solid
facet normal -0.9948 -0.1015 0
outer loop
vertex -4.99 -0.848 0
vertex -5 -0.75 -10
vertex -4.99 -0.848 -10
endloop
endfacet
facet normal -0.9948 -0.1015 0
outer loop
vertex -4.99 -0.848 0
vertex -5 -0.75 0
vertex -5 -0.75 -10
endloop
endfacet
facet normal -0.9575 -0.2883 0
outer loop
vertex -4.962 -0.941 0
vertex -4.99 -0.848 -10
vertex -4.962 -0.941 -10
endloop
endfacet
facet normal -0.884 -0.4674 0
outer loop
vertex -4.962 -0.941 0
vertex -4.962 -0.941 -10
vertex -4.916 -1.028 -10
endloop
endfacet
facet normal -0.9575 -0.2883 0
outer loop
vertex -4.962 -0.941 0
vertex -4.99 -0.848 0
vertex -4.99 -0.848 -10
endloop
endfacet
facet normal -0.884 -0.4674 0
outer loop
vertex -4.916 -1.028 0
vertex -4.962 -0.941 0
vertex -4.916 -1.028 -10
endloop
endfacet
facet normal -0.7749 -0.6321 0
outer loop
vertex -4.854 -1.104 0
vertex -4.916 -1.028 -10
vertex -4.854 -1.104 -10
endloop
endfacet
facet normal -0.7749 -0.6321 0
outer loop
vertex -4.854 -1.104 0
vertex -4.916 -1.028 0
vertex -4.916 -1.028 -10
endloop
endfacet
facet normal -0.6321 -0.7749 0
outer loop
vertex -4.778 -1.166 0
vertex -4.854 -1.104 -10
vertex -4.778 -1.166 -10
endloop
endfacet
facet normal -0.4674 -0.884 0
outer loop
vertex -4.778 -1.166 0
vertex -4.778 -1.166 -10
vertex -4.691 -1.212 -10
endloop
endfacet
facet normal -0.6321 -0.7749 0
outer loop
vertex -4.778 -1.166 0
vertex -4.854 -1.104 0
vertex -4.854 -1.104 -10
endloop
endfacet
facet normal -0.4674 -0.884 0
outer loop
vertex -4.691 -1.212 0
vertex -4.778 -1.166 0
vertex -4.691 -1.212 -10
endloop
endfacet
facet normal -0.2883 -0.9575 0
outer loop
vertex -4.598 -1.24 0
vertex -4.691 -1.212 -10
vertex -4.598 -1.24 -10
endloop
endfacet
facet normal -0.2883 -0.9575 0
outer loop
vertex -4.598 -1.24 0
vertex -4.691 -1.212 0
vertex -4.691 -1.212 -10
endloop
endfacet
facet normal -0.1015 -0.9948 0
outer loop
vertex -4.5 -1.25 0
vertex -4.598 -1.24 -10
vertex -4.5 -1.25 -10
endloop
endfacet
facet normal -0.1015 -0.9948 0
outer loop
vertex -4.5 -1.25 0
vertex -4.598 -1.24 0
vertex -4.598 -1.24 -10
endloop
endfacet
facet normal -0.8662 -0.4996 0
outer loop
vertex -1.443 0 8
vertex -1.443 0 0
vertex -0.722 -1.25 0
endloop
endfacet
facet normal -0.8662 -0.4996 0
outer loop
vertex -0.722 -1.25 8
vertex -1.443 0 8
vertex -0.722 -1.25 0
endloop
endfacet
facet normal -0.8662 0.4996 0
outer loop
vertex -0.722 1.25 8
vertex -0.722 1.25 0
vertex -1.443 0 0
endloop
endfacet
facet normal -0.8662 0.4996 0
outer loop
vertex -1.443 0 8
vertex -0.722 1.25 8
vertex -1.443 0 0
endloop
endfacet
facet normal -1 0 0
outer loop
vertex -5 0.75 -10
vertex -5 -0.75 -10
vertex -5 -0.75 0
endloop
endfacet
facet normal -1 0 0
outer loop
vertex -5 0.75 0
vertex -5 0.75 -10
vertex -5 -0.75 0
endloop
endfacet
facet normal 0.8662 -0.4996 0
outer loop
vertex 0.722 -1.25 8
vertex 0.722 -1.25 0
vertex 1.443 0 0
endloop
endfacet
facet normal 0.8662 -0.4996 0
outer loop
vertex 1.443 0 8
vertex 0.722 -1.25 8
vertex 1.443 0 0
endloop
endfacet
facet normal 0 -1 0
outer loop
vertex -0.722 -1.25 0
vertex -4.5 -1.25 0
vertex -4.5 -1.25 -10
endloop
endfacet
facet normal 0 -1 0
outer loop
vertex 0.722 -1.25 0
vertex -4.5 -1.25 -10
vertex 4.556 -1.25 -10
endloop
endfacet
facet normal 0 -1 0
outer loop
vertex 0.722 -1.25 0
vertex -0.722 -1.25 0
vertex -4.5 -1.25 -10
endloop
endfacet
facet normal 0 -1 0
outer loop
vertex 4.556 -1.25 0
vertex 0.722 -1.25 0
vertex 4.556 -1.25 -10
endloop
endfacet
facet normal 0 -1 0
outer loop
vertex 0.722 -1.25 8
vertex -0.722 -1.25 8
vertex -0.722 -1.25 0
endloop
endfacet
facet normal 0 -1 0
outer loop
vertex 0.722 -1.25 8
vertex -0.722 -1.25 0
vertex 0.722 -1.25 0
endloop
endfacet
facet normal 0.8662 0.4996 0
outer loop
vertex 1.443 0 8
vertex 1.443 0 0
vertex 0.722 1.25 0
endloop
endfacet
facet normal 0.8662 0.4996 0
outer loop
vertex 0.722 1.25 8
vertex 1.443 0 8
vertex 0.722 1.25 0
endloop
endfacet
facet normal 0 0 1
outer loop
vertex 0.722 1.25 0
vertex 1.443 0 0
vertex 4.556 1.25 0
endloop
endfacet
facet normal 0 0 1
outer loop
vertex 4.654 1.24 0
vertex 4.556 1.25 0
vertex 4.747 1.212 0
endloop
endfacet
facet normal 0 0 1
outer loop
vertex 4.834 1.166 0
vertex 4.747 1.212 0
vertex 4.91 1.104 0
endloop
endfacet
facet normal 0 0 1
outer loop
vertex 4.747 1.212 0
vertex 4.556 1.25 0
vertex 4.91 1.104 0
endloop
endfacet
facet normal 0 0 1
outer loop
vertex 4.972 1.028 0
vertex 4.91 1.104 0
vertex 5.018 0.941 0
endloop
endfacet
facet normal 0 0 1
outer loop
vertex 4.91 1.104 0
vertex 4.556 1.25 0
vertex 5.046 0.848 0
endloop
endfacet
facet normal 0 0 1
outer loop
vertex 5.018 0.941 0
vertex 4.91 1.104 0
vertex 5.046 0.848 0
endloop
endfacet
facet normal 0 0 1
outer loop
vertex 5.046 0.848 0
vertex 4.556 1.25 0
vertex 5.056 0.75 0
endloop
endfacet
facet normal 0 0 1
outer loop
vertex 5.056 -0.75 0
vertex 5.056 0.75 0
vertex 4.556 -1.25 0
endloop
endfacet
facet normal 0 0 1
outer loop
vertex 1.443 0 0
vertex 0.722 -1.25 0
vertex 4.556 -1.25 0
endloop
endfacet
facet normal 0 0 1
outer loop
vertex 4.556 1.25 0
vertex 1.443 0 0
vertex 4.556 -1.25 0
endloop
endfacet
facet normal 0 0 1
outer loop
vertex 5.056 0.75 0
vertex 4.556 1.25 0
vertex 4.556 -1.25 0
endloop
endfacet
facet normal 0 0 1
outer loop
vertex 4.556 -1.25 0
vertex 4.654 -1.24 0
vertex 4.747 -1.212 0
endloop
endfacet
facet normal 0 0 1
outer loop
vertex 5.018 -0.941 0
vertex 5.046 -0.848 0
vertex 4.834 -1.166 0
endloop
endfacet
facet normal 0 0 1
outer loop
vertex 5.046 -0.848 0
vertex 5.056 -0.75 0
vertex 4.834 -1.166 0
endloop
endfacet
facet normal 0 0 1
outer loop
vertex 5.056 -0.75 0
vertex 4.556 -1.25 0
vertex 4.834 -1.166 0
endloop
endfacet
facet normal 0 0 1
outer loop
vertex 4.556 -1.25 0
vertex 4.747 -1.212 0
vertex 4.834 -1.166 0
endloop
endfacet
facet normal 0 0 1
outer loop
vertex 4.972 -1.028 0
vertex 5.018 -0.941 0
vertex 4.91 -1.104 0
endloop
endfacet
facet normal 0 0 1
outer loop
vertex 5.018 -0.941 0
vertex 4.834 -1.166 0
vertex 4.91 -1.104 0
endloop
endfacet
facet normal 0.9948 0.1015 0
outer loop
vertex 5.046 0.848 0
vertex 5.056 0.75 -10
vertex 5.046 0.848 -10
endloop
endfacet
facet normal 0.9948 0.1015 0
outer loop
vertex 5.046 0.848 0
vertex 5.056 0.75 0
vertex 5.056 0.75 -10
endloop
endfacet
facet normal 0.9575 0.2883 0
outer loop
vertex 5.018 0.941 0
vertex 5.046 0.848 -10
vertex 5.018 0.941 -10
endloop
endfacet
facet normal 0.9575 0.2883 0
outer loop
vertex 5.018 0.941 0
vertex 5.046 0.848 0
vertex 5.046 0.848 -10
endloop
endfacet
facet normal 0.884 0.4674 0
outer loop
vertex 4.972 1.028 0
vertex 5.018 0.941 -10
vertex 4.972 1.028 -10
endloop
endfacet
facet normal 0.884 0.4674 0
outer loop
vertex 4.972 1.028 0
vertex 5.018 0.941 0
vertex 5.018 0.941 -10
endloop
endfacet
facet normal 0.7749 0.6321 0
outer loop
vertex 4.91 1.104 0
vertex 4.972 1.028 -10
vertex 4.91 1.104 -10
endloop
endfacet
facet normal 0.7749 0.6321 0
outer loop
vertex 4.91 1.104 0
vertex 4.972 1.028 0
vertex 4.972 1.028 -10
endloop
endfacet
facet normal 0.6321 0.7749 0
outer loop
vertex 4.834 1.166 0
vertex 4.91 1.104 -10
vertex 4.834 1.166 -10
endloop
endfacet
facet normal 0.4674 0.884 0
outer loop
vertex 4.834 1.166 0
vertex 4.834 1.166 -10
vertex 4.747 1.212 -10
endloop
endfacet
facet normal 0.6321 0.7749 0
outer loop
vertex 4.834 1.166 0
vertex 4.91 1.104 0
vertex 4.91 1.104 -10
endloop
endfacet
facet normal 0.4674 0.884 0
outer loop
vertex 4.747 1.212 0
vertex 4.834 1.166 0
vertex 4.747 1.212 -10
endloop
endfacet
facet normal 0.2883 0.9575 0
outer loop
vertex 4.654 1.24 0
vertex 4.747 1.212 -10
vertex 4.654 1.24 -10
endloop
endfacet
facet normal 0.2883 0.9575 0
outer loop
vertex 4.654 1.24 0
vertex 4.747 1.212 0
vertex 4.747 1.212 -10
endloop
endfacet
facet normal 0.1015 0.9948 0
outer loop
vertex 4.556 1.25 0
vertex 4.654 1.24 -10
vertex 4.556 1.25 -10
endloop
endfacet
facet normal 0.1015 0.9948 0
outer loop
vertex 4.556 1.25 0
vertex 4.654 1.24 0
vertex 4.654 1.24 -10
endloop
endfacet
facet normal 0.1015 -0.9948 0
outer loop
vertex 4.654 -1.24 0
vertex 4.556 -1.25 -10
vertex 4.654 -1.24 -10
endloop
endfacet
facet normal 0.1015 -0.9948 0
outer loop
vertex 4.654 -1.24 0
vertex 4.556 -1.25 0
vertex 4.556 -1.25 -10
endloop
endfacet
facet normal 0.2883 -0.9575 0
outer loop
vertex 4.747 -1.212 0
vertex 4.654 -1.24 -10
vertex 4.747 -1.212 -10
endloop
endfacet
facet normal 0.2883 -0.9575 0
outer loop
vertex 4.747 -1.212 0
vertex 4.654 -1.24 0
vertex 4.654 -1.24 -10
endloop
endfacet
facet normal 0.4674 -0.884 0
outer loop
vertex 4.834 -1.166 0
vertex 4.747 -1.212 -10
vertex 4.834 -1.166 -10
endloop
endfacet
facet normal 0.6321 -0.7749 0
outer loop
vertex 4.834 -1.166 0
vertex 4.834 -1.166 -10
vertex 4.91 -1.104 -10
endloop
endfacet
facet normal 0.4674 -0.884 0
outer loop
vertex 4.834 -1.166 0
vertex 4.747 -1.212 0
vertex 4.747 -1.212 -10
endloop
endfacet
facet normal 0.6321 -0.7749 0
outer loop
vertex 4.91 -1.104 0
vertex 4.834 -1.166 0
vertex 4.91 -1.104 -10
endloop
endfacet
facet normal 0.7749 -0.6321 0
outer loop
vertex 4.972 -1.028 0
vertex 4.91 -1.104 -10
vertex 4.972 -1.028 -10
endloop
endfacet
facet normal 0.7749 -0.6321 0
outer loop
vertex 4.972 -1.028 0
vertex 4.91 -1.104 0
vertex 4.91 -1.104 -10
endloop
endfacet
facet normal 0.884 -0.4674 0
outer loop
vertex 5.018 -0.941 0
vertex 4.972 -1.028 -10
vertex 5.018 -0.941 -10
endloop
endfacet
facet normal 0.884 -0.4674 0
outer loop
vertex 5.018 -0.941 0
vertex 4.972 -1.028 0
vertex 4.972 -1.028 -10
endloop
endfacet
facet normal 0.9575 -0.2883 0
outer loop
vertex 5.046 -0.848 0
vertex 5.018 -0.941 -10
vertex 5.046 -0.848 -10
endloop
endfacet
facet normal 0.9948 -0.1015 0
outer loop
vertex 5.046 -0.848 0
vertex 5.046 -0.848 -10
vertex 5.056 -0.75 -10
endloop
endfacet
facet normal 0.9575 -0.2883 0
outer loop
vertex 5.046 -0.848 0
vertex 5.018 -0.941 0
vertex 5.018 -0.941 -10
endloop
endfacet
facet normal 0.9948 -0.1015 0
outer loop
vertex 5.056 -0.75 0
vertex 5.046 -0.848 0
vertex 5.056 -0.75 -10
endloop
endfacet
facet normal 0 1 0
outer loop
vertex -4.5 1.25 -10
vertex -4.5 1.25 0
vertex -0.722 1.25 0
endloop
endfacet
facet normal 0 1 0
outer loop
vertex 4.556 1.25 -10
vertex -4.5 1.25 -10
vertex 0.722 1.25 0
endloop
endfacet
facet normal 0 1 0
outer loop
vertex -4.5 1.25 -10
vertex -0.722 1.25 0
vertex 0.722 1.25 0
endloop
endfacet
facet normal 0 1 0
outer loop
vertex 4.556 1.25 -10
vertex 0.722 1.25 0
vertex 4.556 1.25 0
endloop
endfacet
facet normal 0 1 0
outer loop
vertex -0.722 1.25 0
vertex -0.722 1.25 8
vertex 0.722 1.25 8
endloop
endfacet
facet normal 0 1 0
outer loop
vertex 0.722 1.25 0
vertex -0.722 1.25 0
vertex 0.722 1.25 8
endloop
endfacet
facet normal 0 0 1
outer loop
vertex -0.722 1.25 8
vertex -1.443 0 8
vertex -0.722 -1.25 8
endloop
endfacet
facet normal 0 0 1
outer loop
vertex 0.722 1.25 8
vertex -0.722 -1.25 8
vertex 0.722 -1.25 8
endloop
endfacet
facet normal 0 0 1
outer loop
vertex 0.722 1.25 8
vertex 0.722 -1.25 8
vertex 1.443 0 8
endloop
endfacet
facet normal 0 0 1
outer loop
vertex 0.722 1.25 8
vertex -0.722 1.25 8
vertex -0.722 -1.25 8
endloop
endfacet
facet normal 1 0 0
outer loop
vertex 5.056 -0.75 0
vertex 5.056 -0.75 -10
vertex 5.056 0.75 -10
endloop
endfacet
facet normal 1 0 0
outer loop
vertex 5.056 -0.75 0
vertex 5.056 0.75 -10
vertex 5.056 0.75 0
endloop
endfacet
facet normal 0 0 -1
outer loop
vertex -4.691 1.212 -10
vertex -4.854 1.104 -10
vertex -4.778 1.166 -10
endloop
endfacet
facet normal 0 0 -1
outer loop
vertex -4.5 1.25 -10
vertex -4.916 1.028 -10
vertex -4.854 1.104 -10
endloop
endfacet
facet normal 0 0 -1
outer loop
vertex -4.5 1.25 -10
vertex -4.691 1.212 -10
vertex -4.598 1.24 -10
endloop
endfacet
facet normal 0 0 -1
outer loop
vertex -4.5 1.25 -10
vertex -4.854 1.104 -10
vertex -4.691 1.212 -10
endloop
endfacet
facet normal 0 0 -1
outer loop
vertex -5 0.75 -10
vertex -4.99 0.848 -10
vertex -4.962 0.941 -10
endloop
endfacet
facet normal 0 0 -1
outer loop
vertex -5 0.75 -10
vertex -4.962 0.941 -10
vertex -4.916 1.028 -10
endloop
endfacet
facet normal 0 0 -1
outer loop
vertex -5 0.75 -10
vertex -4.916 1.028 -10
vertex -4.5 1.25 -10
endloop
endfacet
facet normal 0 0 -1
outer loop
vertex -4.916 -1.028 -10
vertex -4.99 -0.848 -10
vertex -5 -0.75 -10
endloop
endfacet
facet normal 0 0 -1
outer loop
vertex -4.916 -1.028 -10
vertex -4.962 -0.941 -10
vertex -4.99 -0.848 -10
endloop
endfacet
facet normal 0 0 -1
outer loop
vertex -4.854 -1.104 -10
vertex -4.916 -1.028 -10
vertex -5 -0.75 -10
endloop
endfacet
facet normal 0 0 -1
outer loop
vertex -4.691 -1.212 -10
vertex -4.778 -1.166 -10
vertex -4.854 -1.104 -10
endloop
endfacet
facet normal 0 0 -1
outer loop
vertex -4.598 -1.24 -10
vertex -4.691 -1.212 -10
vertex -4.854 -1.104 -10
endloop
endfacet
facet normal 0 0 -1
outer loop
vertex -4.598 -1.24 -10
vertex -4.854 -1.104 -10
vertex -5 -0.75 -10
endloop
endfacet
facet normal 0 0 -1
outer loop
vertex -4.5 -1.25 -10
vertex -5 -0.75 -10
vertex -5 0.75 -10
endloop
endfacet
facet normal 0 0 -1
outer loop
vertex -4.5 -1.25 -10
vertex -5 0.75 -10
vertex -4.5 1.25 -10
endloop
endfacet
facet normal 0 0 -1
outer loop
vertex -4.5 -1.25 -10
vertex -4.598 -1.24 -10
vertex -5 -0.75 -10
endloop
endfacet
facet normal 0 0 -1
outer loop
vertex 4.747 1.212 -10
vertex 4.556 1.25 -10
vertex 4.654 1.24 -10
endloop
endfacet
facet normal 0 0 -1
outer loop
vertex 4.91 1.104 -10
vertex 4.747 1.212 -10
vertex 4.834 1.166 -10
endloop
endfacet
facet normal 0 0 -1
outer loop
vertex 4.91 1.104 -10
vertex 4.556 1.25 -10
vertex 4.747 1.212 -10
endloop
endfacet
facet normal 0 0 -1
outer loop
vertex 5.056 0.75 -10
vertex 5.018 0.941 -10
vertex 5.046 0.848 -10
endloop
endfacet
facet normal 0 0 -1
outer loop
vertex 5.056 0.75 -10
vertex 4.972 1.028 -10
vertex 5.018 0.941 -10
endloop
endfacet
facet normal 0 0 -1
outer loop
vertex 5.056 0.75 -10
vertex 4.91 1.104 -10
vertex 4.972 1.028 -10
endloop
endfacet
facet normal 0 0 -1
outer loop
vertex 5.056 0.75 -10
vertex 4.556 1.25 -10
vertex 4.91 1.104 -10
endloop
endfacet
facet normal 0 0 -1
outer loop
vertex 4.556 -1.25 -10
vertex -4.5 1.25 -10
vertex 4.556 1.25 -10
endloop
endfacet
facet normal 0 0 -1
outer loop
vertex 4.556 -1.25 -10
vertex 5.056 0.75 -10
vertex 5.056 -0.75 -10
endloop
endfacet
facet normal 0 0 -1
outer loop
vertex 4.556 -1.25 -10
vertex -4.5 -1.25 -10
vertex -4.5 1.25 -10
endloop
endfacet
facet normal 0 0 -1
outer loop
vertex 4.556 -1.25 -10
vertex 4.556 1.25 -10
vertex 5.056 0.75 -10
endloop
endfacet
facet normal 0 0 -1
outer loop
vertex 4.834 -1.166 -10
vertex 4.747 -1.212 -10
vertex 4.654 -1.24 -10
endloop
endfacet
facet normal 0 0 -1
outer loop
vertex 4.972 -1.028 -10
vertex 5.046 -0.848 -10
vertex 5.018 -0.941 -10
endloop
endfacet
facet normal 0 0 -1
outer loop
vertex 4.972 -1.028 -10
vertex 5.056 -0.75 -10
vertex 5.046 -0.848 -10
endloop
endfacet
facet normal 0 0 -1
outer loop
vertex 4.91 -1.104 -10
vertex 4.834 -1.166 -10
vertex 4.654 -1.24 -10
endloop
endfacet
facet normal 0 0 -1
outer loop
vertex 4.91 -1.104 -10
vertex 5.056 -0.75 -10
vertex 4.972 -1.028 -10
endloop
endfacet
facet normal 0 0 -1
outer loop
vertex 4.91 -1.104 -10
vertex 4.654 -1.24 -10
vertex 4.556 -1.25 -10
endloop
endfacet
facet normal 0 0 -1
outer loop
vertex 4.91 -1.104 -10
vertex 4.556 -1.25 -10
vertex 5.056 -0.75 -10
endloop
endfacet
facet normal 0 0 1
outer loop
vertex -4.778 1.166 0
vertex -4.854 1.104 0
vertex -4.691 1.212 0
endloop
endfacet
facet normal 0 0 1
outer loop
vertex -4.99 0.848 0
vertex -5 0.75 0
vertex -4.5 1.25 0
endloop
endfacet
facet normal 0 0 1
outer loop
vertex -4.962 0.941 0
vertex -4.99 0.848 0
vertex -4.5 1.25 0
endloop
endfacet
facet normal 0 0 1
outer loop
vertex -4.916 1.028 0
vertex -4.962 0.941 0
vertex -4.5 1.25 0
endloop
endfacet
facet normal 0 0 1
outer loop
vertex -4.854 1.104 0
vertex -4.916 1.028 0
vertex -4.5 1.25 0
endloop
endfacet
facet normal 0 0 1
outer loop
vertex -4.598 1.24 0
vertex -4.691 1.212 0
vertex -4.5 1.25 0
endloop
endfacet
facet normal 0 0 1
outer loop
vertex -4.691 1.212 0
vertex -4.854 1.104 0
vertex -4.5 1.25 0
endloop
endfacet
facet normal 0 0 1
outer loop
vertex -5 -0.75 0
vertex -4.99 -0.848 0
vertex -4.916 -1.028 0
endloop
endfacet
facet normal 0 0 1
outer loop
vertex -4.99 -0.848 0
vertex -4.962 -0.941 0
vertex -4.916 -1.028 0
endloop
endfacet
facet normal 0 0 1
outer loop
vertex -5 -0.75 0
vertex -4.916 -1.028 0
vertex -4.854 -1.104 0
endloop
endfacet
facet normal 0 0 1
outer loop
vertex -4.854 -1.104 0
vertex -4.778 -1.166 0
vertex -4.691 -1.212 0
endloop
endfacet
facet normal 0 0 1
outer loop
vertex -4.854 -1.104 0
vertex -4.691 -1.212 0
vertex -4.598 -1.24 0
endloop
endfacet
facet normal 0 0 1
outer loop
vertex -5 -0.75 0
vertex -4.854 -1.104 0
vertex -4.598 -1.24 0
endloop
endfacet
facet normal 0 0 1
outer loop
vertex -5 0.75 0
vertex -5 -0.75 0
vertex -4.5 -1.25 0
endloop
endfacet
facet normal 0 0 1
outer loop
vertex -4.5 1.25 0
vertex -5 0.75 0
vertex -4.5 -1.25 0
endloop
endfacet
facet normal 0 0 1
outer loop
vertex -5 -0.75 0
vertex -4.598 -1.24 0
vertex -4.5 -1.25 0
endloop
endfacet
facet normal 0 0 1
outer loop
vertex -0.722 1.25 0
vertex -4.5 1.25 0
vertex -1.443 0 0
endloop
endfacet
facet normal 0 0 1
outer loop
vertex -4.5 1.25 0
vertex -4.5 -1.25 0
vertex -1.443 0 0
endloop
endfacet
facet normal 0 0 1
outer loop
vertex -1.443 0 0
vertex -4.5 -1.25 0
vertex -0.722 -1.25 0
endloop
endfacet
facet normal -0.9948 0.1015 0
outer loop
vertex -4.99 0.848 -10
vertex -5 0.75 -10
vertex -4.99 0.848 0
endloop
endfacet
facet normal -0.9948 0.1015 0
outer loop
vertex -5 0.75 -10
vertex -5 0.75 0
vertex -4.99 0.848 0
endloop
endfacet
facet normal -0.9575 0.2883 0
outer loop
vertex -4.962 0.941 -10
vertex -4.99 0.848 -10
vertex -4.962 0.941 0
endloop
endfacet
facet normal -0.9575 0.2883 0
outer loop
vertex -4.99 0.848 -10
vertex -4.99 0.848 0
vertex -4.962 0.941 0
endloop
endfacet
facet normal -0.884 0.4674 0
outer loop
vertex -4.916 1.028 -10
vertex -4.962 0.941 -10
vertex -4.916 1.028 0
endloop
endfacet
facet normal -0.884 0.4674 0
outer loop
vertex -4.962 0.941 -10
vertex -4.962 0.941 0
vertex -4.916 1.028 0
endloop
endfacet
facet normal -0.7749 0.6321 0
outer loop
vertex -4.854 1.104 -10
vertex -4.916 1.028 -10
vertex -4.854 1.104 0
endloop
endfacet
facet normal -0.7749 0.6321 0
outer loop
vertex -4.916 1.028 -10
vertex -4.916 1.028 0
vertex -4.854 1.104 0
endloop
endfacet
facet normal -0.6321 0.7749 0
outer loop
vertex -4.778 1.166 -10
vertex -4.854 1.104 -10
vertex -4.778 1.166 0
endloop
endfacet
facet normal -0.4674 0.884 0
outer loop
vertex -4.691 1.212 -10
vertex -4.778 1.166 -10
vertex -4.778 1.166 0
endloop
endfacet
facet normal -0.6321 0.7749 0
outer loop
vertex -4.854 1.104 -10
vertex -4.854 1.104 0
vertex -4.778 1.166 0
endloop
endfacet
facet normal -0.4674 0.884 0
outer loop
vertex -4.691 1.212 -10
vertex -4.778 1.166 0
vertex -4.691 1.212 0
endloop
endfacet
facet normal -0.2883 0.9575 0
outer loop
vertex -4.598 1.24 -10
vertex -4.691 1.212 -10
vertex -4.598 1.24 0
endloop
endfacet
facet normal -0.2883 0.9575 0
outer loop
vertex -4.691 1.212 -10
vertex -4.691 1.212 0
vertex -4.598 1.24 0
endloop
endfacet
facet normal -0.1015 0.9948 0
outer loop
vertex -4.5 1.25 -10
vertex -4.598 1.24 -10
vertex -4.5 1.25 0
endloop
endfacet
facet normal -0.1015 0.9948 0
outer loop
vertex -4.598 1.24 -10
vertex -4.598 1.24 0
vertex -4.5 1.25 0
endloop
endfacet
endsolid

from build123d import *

# Parameters (mm, degrees)
F1_DEPTH      = 8
F2_W          = 10.055962
F2_H          = 10
F3_DEPTH      = 1.25
F3_DEPTH_BACK = 1.25
F4_R          = 0.5


with BuildPart() as f1:
    # F0 (on Top) → F1 (new body)
    with BuildSketch(Plane.XY):
        Polygon((0.721688, 1.25), (-0.721688, 1.25), (-1.443376, 0), (-0.721688, -1.25), (0.721688, -1.25), (1.443376, 0), align=None)
    extrude(amount=F1_DEPTH)

    # F2 (on Front) → F3 (join, two sides)
    with BuildSketch(Plane.XZ) as f3_sk:
        with Locations((0.027981, -5)):
            Rectangle(F2_W, F2_H)
    extrude(amount=F3_DEPTH)
    extrude(f3_sk.sketch, amount=-F3_DEPTH_BACK)

    # F4
    f4_edges = [f1.edges().sort_by_distance(p)[0] for p in [
        (5.055962, -1.25, -5),
        (5.055962, 1.25, -5),
        (-5, -1.25, -5),
        (-5, 1.25, -5),
    ]]
    fillet(f4_edges, radius=F4_R)


solid = f1.part
